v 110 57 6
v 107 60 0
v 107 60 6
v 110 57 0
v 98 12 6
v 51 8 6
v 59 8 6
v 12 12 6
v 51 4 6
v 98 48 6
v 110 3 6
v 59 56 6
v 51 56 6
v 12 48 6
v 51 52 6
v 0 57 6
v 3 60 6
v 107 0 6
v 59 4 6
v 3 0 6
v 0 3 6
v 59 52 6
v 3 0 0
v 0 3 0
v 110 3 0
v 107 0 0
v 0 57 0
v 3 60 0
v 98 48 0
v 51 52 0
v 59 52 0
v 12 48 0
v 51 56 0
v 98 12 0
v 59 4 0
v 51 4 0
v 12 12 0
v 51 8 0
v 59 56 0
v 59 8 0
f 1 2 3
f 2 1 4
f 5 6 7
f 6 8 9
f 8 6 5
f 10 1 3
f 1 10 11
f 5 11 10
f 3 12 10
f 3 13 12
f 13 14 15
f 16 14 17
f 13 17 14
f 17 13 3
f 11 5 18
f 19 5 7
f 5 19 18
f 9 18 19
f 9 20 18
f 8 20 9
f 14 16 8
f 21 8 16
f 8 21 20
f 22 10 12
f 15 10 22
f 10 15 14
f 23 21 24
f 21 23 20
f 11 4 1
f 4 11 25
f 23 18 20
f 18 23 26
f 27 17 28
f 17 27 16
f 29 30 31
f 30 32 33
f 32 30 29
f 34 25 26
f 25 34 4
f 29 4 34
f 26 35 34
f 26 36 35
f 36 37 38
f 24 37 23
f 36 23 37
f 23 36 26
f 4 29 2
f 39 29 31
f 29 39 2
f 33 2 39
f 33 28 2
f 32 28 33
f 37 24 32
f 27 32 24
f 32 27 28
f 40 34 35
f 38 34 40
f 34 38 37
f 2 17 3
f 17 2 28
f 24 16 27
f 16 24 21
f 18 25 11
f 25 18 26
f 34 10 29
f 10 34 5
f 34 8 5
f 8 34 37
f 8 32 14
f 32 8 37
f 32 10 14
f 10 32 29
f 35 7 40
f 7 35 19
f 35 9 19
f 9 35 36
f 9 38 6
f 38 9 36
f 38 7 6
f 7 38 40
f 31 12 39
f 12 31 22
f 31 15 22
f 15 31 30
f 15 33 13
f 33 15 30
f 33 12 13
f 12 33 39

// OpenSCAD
$fn = 32;

// ----------------------------------------------------------------------
// Frame plate: 110 x 60 frame, 12 mm rails
// ----------------------------------------------------------------------

// --- parameters (mm) ---
plate_l = 110;            // plate length, X
plate_w = 60;             // plate width, Y
plate_t = 6;              // plate thickness, Z (extrusion height)
corner_c = 3;             // corner chamfer
frame_bar = 12;           // frame rail width
slot_l = 8;               // adjustment slot length
slot_w = 4;               // adjustment slot width
fit_tol = 0.05;           // declared fit tolerance (prompt contract)
free_tol = 0.3;           // declared free tolerance (prompt contract)

win_l = plate_l - 2 * frame_bar;  // window length
win_w = plate_w - 2 * frame_bar;  // window width

profile = [[3, 0], [107, 0], [110, 3], [110, 57], [107, 60], [3, 60], [0, 57], [0, 3]];  // primary outline, 8 points, counter clockwise
void_1 = [[12, 12], [98, 12], [98, 48], [12, 48]];  // the window, 4 points
void_2 = [[51, 4], [59, 4], [59, 8], [51, 8]];  // adjustment slot, 4 points
void_3 = [[51, 52], [59, 52], [59, 56], [51, 56]];  // adjustment slot, 4 points

// --- the one profile operation ---
difference() {
  linear_extrude(height = plate_t) polygon(points = profile);
  translate([0, 0, -1])
    linear_extrude(height = plate_t + 2) polygon(points = void_1);
  translate([0, 0, -1])
    linear_extrude(height = plate_t + 2) polygon(points = void_2);
  translate([0, 0, -1])
    linear_extrude(height = plate_t + 2) polygon(points = void_3);
}
